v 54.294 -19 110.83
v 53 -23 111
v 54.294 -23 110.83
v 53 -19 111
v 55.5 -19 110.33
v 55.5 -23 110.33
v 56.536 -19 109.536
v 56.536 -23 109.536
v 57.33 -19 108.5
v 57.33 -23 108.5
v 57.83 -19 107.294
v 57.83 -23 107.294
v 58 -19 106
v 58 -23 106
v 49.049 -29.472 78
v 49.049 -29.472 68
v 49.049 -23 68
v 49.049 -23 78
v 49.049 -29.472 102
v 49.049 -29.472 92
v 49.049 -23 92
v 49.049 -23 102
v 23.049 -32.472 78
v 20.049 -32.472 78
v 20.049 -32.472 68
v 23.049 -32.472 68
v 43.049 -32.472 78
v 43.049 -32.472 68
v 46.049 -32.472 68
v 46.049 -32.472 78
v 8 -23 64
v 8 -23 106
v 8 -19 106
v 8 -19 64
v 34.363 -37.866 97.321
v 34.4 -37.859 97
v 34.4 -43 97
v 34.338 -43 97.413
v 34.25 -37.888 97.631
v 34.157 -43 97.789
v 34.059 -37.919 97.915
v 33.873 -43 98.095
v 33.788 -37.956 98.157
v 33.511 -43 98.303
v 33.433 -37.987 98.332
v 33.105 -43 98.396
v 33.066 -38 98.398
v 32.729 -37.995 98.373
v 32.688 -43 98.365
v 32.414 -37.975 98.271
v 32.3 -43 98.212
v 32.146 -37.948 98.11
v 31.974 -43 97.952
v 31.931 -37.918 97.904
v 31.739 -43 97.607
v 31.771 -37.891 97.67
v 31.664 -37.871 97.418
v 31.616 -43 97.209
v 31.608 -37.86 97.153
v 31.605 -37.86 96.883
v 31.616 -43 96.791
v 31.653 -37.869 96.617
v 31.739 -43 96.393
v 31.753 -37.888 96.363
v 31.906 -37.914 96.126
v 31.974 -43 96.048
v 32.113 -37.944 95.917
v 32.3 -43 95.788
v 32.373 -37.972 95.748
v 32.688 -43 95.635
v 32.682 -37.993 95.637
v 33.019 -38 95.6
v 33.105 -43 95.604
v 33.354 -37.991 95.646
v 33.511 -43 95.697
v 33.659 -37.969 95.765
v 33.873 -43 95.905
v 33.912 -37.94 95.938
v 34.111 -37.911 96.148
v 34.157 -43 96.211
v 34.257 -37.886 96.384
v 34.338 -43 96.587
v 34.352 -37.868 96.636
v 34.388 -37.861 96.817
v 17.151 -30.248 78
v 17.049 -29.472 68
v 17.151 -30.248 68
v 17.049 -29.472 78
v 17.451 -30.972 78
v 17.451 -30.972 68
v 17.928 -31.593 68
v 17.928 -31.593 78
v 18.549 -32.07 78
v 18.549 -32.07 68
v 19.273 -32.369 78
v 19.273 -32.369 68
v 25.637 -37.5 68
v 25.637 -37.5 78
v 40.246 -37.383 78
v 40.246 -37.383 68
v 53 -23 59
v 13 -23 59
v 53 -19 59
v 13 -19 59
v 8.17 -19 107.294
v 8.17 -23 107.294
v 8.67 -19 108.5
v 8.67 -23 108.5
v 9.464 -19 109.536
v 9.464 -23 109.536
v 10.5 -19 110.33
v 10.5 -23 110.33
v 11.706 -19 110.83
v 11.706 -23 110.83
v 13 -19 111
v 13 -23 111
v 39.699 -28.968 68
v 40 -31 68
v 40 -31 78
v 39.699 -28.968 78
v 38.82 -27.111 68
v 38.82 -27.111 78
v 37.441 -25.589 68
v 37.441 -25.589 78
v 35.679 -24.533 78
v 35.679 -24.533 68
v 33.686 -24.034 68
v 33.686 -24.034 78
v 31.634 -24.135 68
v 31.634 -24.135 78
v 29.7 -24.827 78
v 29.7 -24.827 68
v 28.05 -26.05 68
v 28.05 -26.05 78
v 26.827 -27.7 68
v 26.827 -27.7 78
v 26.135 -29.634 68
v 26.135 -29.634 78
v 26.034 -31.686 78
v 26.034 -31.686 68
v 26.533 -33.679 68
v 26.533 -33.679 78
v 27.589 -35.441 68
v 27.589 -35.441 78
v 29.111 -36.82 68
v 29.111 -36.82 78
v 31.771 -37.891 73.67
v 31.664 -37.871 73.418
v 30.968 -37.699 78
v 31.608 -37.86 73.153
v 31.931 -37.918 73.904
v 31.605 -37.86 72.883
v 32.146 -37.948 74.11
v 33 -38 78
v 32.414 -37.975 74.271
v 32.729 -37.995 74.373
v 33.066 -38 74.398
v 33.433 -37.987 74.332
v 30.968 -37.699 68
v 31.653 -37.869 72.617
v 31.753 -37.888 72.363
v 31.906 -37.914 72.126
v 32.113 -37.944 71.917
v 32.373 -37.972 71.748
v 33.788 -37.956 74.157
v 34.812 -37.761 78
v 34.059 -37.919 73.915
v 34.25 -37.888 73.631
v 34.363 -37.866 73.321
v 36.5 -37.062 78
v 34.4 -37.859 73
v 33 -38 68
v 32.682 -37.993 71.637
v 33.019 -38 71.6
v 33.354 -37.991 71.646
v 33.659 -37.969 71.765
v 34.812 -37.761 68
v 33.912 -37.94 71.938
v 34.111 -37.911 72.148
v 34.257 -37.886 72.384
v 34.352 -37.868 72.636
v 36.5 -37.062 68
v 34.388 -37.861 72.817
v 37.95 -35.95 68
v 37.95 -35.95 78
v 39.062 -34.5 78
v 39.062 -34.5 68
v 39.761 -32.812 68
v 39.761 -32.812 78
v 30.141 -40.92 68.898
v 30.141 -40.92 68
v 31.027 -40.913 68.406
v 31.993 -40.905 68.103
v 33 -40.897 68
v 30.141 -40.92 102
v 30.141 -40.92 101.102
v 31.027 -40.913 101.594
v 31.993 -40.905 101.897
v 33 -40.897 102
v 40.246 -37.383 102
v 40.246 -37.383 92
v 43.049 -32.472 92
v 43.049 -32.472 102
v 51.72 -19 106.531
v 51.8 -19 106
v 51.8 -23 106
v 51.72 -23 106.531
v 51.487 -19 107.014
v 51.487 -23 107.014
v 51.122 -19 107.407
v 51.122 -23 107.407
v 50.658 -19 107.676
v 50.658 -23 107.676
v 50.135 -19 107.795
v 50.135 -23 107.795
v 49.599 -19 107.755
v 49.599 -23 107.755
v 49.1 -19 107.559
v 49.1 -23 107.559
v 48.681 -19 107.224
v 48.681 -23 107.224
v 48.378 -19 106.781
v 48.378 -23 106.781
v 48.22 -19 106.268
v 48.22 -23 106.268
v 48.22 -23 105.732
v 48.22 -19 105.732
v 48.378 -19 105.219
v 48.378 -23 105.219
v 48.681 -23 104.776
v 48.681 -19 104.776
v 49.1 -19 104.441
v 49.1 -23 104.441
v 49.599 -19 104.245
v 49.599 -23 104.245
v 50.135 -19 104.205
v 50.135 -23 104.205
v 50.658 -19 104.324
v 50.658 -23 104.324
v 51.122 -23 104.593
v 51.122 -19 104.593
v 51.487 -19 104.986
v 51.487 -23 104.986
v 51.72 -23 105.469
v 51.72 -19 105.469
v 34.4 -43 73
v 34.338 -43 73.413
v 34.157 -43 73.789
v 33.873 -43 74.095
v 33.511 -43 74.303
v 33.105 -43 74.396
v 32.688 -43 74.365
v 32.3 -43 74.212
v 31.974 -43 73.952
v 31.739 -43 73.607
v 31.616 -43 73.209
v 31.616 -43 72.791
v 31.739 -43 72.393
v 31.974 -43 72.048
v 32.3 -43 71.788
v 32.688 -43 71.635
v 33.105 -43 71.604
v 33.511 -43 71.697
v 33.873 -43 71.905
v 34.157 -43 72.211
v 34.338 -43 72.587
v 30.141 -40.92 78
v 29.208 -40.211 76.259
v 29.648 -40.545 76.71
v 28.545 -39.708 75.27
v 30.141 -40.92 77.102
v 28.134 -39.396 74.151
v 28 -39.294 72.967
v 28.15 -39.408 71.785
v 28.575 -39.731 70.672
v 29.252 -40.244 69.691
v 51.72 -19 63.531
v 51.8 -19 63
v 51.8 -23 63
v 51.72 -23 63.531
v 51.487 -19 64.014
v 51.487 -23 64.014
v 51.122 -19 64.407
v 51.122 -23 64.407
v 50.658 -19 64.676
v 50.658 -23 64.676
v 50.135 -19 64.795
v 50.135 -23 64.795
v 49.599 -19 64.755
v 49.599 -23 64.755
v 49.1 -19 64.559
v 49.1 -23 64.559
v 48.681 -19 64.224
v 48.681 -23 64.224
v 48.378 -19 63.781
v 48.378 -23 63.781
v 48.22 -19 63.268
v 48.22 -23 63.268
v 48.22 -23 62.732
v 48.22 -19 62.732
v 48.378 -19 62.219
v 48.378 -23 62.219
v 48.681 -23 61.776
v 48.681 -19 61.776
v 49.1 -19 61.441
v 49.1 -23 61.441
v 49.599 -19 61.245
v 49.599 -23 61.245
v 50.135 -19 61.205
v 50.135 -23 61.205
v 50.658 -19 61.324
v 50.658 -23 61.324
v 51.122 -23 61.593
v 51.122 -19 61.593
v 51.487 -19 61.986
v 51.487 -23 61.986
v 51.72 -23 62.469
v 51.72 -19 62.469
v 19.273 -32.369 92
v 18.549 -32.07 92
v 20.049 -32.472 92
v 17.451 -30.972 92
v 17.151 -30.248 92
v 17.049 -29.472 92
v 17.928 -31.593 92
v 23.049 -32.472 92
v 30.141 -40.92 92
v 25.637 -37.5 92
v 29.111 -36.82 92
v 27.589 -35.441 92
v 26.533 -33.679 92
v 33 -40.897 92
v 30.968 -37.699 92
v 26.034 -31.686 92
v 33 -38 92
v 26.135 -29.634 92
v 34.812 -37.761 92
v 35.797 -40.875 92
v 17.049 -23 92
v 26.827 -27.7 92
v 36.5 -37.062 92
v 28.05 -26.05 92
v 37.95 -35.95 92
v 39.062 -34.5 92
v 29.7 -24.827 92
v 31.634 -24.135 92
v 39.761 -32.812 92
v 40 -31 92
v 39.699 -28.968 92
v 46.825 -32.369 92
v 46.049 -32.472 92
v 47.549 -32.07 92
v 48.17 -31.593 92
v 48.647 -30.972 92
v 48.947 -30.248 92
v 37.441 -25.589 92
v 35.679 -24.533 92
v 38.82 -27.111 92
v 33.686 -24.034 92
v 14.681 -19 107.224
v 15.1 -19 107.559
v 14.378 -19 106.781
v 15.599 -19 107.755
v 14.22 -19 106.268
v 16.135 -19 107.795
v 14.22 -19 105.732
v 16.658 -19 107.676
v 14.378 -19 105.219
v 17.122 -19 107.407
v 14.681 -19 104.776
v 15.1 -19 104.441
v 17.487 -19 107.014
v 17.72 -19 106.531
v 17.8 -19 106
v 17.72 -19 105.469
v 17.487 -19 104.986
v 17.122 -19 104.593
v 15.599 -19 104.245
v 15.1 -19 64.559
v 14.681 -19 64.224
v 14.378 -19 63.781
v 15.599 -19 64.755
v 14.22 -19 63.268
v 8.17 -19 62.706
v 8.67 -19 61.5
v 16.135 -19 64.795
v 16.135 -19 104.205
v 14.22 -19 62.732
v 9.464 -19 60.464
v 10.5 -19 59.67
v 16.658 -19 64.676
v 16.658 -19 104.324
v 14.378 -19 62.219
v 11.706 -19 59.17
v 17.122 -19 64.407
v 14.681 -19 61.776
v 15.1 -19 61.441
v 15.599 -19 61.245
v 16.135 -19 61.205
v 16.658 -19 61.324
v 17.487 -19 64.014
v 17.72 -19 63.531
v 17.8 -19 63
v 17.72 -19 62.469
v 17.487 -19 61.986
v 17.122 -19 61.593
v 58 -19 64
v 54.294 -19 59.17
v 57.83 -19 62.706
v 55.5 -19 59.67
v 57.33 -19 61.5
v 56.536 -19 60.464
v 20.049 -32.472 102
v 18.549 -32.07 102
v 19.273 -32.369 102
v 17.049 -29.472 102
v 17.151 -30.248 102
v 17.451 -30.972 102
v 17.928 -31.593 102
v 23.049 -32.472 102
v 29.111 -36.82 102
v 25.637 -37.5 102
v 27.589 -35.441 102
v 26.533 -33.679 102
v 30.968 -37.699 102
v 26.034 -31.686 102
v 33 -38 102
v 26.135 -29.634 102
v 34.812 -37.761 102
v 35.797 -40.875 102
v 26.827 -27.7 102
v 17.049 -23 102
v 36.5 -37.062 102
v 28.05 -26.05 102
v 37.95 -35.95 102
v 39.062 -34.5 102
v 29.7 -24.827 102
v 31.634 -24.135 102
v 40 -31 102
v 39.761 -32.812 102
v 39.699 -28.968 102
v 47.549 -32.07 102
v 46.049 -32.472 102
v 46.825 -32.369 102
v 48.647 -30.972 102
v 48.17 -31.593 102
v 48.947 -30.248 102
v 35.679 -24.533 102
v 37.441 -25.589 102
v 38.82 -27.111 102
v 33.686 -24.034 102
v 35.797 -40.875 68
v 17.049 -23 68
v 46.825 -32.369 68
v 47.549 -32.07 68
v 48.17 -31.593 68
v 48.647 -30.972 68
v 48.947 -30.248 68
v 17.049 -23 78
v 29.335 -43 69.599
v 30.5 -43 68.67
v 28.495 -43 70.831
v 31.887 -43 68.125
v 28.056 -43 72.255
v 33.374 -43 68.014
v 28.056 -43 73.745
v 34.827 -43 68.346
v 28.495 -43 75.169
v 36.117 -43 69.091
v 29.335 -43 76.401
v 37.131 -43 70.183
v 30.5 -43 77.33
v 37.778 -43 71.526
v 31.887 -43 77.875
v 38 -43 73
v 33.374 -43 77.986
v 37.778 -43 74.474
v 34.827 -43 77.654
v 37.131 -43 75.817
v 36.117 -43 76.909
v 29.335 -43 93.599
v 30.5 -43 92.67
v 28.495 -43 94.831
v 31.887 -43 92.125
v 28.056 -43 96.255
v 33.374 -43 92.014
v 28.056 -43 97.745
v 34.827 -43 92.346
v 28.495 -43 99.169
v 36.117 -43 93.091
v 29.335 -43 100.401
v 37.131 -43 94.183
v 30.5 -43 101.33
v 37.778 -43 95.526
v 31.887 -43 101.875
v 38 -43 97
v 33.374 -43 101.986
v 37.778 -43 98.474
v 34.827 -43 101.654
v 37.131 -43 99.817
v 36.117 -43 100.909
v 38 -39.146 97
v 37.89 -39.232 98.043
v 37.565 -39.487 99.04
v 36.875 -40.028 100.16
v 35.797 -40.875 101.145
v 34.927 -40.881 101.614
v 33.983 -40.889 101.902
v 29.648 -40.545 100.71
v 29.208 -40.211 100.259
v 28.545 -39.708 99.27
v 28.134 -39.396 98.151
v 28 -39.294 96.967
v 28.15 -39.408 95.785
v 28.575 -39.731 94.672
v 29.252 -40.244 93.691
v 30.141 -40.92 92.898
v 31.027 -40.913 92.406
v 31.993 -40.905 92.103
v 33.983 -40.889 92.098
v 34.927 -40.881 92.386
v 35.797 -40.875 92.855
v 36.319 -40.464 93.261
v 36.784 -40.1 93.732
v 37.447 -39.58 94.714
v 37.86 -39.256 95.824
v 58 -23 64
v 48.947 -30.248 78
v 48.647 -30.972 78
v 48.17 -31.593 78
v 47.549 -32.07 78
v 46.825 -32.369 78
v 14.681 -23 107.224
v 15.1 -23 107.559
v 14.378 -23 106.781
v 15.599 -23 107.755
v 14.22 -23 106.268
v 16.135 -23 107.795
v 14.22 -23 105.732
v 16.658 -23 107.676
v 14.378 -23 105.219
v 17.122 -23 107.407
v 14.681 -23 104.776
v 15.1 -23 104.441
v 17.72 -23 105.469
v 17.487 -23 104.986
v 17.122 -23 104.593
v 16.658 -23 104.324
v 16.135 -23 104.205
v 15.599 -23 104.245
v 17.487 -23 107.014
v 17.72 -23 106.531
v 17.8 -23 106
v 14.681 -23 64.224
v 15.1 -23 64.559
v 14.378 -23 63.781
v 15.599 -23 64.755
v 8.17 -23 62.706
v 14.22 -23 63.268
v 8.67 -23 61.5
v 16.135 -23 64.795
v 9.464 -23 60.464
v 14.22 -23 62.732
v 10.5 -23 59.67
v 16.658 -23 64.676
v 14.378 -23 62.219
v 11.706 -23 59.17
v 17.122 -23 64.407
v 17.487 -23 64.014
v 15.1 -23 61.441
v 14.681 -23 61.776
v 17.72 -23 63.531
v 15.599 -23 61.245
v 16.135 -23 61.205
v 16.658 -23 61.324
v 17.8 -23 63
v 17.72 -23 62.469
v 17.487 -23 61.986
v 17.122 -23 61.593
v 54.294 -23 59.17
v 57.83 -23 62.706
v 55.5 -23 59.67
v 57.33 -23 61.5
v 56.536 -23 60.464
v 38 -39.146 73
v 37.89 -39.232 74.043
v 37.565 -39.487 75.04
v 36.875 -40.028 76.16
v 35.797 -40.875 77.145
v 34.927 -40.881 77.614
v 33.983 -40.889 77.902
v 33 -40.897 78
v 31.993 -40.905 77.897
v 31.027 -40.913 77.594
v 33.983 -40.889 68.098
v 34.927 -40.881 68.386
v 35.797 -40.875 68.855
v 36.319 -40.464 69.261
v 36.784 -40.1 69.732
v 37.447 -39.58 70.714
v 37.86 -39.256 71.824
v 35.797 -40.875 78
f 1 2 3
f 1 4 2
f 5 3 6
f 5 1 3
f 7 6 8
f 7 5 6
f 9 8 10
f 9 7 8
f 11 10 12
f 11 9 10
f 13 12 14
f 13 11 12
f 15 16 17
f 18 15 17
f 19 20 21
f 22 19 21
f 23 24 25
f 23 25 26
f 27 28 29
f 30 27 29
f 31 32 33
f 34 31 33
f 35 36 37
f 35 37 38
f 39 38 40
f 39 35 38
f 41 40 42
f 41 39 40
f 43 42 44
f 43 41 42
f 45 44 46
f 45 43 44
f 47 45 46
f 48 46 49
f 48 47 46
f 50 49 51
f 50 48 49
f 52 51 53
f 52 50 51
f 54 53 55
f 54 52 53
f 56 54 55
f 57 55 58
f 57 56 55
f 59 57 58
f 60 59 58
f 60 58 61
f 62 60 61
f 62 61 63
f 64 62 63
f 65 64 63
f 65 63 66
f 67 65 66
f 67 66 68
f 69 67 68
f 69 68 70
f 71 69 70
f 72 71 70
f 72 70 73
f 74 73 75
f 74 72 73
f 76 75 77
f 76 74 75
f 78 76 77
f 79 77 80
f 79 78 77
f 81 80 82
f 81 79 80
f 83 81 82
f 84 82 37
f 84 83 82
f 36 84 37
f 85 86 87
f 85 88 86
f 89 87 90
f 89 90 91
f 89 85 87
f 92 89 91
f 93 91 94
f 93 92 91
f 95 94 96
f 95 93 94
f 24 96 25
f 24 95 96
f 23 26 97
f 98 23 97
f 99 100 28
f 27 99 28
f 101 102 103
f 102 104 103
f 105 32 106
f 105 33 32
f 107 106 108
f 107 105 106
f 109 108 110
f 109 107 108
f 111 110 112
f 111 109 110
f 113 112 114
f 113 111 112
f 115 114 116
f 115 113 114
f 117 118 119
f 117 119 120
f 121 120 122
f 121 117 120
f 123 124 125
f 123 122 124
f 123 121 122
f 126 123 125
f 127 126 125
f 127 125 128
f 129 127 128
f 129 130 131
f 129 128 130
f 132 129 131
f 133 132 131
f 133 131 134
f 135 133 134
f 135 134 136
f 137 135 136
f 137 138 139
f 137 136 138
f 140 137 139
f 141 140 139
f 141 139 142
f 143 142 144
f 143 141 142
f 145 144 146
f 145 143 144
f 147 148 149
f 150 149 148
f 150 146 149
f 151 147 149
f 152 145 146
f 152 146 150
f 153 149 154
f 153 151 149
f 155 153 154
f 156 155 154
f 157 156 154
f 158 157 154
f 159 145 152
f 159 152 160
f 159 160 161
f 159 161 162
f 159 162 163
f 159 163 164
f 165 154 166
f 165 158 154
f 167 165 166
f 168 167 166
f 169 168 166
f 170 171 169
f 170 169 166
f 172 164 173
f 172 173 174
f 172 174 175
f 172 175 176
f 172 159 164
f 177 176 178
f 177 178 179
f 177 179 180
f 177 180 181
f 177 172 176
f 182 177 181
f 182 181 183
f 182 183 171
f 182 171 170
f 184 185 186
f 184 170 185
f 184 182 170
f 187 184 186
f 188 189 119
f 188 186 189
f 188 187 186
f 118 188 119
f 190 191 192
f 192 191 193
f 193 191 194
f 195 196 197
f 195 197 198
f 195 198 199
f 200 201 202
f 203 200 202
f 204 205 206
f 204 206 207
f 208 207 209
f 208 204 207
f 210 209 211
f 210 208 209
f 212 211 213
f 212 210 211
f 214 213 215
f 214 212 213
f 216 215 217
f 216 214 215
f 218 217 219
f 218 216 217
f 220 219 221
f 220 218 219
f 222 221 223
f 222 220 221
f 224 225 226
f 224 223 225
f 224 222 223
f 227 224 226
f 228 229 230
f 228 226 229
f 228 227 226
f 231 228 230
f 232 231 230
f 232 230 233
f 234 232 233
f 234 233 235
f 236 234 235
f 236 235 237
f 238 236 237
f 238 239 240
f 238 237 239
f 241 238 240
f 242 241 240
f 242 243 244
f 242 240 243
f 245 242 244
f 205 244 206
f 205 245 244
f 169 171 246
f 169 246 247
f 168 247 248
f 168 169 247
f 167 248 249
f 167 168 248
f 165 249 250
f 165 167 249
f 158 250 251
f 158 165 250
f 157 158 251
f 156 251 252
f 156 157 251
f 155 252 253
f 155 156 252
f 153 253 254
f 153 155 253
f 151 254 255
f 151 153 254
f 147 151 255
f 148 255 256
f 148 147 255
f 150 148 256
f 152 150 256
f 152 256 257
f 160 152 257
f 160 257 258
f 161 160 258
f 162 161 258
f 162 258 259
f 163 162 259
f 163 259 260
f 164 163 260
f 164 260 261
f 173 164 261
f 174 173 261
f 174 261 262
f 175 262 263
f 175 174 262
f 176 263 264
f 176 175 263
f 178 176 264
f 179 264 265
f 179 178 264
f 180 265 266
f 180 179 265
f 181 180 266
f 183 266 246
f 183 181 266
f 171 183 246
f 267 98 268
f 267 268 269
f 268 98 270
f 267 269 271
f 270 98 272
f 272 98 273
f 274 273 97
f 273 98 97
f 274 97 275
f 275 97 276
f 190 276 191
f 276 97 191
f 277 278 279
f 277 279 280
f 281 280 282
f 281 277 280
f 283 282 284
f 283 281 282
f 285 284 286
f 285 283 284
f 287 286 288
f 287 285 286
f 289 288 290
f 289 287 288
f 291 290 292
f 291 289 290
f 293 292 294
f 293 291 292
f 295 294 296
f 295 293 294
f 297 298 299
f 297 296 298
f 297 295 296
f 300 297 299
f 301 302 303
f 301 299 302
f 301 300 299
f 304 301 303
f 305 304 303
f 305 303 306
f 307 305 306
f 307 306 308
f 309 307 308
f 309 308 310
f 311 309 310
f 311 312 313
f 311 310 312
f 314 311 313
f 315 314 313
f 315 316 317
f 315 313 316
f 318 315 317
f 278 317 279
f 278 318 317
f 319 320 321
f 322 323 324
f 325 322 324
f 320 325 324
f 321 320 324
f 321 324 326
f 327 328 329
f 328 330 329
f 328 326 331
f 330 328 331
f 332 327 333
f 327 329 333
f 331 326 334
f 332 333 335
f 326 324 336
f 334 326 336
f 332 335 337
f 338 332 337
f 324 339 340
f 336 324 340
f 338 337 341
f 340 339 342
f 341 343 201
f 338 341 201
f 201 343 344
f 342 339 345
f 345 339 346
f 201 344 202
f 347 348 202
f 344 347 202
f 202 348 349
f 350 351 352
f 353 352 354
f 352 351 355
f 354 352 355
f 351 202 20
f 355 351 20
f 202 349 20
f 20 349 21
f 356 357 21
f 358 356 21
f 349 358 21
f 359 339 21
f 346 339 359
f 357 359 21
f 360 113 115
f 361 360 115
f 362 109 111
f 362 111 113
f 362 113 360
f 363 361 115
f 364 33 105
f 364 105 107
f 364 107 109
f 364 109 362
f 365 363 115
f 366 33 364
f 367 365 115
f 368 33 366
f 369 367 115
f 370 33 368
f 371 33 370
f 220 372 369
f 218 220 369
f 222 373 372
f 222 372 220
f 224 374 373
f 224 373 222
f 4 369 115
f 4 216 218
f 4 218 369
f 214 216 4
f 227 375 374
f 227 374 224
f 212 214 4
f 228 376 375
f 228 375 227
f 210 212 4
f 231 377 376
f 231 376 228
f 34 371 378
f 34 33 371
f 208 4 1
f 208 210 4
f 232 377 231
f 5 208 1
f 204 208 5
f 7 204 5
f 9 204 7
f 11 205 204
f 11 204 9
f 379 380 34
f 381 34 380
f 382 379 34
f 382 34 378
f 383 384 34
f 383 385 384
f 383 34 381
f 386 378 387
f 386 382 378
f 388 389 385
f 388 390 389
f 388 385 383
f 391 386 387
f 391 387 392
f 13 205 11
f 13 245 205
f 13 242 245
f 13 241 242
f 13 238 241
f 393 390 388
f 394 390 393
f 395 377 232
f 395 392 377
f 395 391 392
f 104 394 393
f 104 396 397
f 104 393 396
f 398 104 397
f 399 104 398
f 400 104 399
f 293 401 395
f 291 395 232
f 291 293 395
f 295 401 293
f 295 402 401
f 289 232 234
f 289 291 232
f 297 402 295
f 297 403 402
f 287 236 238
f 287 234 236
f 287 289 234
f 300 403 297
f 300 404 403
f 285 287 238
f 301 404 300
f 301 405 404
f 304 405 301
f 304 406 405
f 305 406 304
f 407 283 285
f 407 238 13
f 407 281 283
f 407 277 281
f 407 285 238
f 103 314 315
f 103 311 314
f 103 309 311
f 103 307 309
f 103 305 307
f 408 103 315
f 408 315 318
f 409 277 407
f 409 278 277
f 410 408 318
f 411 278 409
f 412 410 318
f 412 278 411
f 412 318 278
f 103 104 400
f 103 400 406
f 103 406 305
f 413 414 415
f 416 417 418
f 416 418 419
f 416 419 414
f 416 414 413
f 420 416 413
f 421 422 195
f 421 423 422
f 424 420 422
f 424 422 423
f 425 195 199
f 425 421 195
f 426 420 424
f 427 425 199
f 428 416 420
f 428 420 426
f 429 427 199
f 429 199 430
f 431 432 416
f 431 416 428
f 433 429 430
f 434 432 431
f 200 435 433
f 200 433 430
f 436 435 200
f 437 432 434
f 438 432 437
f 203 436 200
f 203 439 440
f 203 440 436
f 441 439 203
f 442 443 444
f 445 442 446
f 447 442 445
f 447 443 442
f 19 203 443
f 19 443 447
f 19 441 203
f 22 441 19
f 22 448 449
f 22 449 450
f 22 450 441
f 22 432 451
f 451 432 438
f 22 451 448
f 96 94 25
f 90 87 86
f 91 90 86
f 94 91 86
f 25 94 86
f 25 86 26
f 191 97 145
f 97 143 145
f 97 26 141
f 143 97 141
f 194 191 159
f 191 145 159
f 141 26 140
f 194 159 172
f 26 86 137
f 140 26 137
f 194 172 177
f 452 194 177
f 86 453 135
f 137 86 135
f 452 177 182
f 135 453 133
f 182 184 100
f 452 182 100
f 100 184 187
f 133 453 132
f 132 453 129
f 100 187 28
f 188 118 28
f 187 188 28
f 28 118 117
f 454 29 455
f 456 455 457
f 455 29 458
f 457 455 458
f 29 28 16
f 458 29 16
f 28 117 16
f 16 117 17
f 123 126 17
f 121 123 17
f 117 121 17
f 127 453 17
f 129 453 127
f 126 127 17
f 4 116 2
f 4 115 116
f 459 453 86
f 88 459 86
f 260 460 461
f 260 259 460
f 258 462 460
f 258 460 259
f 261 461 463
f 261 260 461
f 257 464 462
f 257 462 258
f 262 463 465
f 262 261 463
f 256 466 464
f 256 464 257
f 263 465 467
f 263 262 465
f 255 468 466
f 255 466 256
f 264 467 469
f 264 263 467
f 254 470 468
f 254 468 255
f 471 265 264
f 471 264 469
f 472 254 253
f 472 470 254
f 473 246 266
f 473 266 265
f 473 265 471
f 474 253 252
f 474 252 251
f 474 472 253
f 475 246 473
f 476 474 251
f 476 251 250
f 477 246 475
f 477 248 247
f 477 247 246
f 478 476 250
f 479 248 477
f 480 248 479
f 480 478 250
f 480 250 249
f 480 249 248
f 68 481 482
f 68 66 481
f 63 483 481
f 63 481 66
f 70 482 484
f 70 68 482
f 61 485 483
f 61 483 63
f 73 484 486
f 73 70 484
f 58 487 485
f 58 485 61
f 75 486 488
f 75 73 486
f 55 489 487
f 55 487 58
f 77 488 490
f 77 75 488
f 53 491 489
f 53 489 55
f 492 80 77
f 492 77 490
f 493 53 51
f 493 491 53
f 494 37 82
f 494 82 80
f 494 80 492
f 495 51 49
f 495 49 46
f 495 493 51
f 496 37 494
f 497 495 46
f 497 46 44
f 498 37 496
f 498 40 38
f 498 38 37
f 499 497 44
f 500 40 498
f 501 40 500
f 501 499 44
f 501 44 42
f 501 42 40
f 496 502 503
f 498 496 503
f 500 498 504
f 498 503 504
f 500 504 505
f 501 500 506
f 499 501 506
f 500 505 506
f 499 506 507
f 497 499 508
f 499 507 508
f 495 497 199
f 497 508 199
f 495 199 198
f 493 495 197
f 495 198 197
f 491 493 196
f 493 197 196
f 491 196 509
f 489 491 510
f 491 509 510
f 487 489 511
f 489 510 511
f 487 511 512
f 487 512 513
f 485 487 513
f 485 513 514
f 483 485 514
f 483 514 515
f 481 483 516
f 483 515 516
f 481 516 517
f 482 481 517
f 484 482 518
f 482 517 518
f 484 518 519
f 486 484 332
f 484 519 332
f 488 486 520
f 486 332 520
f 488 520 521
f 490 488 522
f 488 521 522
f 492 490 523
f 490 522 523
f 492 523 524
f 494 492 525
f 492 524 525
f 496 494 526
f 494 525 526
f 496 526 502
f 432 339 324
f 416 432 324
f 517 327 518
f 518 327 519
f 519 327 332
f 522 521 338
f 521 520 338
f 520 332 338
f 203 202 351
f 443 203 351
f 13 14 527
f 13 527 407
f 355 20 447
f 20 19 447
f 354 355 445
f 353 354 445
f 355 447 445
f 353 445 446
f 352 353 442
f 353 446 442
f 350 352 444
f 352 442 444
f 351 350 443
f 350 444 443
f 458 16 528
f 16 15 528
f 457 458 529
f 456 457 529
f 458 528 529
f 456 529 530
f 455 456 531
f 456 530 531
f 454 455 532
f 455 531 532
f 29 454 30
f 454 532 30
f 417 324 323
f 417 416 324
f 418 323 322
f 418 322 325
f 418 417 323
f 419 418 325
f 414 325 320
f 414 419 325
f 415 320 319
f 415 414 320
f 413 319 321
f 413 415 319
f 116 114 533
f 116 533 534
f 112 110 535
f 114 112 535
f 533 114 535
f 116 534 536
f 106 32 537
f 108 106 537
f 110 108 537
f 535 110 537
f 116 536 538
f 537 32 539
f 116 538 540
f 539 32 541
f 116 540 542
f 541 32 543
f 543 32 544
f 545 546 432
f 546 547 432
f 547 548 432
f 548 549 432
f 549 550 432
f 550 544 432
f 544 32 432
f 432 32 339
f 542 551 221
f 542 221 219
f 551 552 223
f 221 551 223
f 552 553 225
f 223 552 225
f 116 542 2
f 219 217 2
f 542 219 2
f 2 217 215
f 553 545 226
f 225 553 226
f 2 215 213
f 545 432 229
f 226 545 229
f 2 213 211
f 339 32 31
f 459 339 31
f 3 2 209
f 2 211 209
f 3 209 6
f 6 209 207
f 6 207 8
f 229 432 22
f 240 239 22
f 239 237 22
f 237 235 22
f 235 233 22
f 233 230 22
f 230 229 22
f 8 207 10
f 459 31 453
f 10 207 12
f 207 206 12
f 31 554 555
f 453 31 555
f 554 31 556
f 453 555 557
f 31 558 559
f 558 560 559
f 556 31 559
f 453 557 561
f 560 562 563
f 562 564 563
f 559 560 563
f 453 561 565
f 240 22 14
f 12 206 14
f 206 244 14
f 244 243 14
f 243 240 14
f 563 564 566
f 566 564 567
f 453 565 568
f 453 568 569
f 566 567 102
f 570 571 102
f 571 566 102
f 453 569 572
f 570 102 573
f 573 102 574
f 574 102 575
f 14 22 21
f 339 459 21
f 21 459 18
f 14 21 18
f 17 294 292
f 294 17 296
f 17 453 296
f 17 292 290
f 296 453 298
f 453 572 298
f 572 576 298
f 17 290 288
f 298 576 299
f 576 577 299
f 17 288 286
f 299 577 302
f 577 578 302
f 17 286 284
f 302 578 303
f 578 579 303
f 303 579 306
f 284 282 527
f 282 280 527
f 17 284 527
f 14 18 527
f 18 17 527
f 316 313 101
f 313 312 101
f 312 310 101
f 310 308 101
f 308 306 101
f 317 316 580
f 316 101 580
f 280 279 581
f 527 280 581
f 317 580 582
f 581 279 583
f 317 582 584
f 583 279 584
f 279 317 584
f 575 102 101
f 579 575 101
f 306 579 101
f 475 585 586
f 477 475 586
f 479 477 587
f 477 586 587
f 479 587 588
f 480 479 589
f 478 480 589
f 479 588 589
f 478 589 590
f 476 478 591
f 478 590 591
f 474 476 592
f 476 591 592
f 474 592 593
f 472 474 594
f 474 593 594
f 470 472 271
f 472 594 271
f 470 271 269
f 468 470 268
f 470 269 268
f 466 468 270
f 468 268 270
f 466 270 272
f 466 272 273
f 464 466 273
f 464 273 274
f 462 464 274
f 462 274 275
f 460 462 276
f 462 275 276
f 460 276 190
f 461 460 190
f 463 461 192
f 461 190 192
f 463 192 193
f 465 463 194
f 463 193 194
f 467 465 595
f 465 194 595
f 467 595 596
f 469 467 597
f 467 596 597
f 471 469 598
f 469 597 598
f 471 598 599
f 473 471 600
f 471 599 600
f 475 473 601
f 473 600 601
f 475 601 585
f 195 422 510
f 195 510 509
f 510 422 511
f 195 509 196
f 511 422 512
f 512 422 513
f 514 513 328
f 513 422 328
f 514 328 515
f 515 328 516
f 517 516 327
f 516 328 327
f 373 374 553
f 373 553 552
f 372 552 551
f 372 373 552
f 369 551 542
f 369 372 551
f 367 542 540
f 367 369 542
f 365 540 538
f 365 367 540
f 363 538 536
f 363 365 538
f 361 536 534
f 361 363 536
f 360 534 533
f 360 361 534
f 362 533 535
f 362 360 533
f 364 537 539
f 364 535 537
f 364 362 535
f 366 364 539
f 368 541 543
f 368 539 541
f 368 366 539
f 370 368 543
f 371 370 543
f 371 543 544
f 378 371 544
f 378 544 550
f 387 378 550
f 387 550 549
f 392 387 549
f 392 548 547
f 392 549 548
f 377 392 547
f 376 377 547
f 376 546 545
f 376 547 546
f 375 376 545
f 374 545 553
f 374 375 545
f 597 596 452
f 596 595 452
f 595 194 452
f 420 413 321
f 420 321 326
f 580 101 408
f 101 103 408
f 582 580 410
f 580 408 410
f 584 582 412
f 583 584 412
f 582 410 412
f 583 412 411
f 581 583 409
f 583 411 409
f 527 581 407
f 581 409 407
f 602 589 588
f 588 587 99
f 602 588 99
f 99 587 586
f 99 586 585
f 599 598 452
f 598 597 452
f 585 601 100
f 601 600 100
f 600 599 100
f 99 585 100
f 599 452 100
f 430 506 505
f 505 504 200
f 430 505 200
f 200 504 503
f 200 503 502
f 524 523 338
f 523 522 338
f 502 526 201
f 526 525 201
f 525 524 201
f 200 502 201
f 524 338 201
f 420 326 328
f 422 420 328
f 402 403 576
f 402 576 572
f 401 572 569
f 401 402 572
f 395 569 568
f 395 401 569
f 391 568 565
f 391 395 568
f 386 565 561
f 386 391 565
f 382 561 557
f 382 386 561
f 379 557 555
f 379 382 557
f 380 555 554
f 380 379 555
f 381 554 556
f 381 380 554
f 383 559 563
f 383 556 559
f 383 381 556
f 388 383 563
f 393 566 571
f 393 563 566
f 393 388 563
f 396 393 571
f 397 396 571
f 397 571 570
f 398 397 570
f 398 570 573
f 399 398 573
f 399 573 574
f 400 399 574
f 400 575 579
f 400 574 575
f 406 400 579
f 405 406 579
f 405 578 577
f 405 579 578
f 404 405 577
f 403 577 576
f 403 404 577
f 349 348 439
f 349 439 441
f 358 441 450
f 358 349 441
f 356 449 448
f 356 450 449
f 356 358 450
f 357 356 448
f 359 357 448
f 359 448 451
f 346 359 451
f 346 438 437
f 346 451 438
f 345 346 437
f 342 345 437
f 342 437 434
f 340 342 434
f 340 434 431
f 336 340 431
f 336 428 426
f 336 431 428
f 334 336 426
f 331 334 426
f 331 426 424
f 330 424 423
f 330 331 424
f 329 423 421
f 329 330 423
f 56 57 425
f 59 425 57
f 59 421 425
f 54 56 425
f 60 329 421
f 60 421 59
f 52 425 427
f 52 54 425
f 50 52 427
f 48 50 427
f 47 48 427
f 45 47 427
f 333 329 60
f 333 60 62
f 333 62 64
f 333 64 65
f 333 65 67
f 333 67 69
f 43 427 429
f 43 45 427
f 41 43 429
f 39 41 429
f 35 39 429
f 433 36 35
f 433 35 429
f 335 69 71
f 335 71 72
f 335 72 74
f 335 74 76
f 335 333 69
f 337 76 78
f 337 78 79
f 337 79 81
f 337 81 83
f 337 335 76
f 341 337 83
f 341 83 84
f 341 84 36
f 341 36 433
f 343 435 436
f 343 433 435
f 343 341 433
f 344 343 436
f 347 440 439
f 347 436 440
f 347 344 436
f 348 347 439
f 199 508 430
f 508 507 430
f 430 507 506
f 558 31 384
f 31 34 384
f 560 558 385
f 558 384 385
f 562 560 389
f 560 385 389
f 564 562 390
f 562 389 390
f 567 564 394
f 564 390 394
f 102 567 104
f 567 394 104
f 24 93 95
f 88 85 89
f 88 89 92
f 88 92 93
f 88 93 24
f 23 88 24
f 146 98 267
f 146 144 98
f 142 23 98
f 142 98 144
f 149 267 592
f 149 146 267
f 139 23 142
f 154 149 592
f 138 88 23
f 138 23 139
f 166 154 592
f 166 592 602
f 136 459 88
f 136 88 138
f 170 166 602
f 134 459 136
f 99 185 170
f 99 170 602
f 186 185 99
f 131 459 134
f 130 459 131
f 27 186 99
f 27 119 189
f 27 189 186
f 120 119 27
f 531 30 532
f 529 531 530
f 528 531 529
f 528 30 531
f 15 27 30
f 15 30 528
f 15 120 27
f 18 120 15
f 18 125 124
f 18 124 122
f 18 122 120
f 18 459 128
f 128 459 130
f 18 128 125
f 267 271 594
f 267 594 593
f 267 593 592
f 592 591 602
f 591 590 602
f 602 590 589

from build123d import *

# Parameters (mm, degrees)
BOX058_W                = 50
BOX058_H                = 37
BOX058_DEPTH            = 48
BOX057_W                = 59
BOX057_H                = 68
BOX057_DEPTH            = 48
BOX056_W                = 3
BOX056_H                = 6
BOX056_DEPTH            = 23
CYLINDER114_R           = 1.4
CYLINDER114_DEPTH       = 10
CYLINDER114_ROLL_ANGLE  = 90
CYLINDER116_R           = 1.4
CYLINDER116_DEPTH       = 10
CYLINDER116_ROLL_ANGLE  = 90
CYLINDER113_R           = 5
CYLINDER113_DEPTH       = 5
CYLINDER113_ROLL_ANGLE  = 90
CYLINDER112_R           = 3
CYLINDER112_DEPTH       = 180
CYLINDER112_PITCH_ANGLE = 90
PAD056_DEPTH            = 10
PAD055_DEPTH            = 10
CYLINDER110_R           = 7.5
CYLINDER110_DEPTH       = 180
CYLINDER110_PITCH_ANGLE = 90
CYLINDER111_R           = 7
CYLINDER111_DEPTH       = 120
PAD054_DEPTH            = 10
PAD053_DEPTH            = 10
BOX055_W                = 32
BOX055_H                = 23
BOX055_DEPTH            = 22
FILLET045_R             = 5
FILLET046_R             = 8
FILLET047_R             = 8
FILLET048_R             = 3
FILLET049_R             = 1
FILLET050_R             = 1
FILLET051_R             = 1
FILLET052_R             = 1
CYLINDER115_R           = 5
CYLINDER115_DEPTH       = 5
CYLINDER115_ROLL_ANGLE  = 90
BOX048_W                = 50
BOX048_H                = 37
BOX048_DEPTH            = 48
BOX046_W                = 59
BOX046_H                = 68
BOX046_DEPTH            = 48
BOX040_W                = 3
BOX040_H                = 6
BOX040_DEPTH            = 23
CYLINDER082_R           = 1.4
CYLINDER082_DEPTH       = 10
CYLINDER082_ROLL_ANGLE  = 90
CYLINDER084_R           = 1.4
CYLINDER084_DEPTH       = 10
CYLINDER084_ROLL_ANGLE  = 90
CYLINDER081_R           = 5
CYLINDER081_DEPTH       = 5
CYLINDER081_ROLL_ANGLE  = 90
CYLINDER080_R           = 3
CYLINDER080_DEPTH       = 180
CYLINDER080_PITCH_ANGLE = 90
PAD044_DEPTH            = 10
PAD043_DEPTH            = 10
CYLINDER075_R           = 7.5
CYLINDER075_DEPTH       = 180
CYLINDER075_PITCH_ANGLE = 90
CYLINDER077_R           = 7
CYLINDER077_DEPTH       = 120
PAD042_DEPTH            = 10
PAD_DEPTH               = 10
BOX039_W                = 32
BOX039_H                = 23
BOX039_DEPTH            = 22
FILLET021_R             = 5
FILLET022_R             = 8
FILLET023_R             = 8
FILLET024_R             = 3
FILLET025_R             = 1
FILLET026_R             = 1
FILLET027_R             = 1
FILLET028_R             = 1
CYLINDER083_R           = 5
CYLINDER083_DEPTH       = 5
CYLINDER083_ROLL_ANGLE  = 90
CYLINDER103_R           = 1.8
CYLINDER103_DEPTH       = 34
CYLINDER103_ROLL_ANGLE  = 90
CYLINDER102_R           = 1.8
CYLINDER102_DEPTH       = 34
CYLINDER102_ROLL_ANGLE  = 90
CYLINDER105_R           = 1.8
CYLINDER105_DEPTH       = 34
CYLINDER105_ROLL_ANGLE  = 90
CYLINDER104_R           = 1.8
CYLINDER104_DEPTH       = 34
CYLINDER104_ROLL_ANGLE  = 90
BOX053_W                = 50
BOX053_H                = 4
BOX053_DEPTH            = 52
FILLET053_R             = 5


with BuildPart() as cubo053:
    # Box058 → Box058 (new body)
    with BuildSketch(Plane(origin=(8, -47, 80), x_dir=(1, 0, 0), z_dir=(0, 0, 1))):
        with Locations((25, 18.5)):
            Rectangle(BOX058_W, BOX058_H)
    extrude(amount=BOX058_DEPTH)


with BuildPart() as cubo052:
    # Box057 → Box057 (new body)
    with BuildSketch(Plane(origin=(0, -19, 64), x_dir=(1, 0, 0), z_dir=(0, 0, 1))):
        with Locations((29.5, 34)):
            Rectangle(BOX057_W, BOX057_H)
    extrude(amount=BOX057_DEPTH)


with BuildPart() as cubo051:
    # Box056 → Box056 (new body)
    with BuildSketch(Plane(origin=(17, -11, 79), x_dir=(1, 0, 0), z_dir=(0, 0, 1))):
        with Locations((1.5, 3)):
            Rectangle(BOX056_W, BOX056_H)
    extrude(amount=BOX056_DEPTH)


with BuildPart() as cilindro068:
    # Cylinder114 → Cylinder114 (new body)
    with BuildSketch(Plane.XY):
        Circle(CYLINDER114_R)
    extrude(amount=CYLINDER114_DEPTH)


with BuildPart() as cilindro068_1:
    # Cylinder114 roll: moved
    add(cilindro068.part.rotate(Axis((0, 0, 0), (1, 0, 0)), CYLINDER114_ROLL_ANGLE))


with BuildPart() as cilindro068_2:
    # Cylinder114 placement: moved
    add(cilindro068_1.part.moved(Location((33, -27, 105))))


with BuildPart() as cilindro070:
    # Cylinder116 → Cylinder116 (new body)
    with BuildSketch(Plane.XY):
        Circle(CYLINDER116_R)
    extrude(amount=CYLINDER116_DEPTH)


with BuildPart() as cilindro070_1:
    # Cylinder116 roll: moved
    add(cilindro070.part.rotate(Axis((0, 0, 0), (1, 0, 0)), CYLINDER116_ROLL_ANGLE))


with BuildPart() as cilindro070_2:
    # Cylinder116 placement: moved
    add(cilindro070_1.part.moved(Location((33, -27, 75))))


with BuildPart() as cilindro067:
    # Cylinder113 → Cylinder113 (new body)
    with BuildSketch(Plane.XY):
        Circle(CYLINDER113_R)
    extrude(amount=CYLINDER113_DEPTH)


with BuildPart() as cilindro067_1:
    # Cylinder113 roll: moved
    add(cilindro067.part.rotate(Axis((0, 0, 0), (1, 0, 0)), CYLINDER113_ROLL_ANGLE))


with BuildPart() as cilindro067_2:
    # Cylinder113 placement: moved
    add(cilindro067_1.part.moved(Location((33, -31, 105))))


with BuildPart() as m033:
    # Cylinder112 → Cylinder112 (new body)
    with BuildSketch(Plane.XY):
        Circle(CYLINDER112_R)
    extrude(amount=CYLINDER112_DEPTH)


with BuildPart() as m033_1:
    # Cylinder112 pitch: moved
    add(m033.part.rotate(Axis((0, 0, 0), (0, 1, 0)), CYLINDER112_PITCH_ANGLE))


with BuildPart() as m033_2:
    # Cylinder112 placement: moved
    add(m033_1.part.moved(Location((-12, 9, 100))))


with BuildPart() as pad056:
    # Sketch063 → Pad056 (new body)
    with BuildSketch(Plane(origin=(43, 9, 0), x_dir=(0, 1, 0), z_dir=(1, 0, 0))):
        Polygon((-4.713422, 99.981385), (-2.357765, 95.901267), (2.35355, 95.901267), (4.709208, 99.981385), (2.35355, 104.061504), (-2.357765, 104.061504), align=None)
    extrude(amount=PAD056_DEPTH)


with BuildPart() as pad055:
    # Sketch062 → Pad055 (new body)
    with BuildSketch(Plane(origin=(13, 9, 0), x_dir=(0, 1, 0), z_dir=(1, 0, 0))):
        Polygon((-4.713422, 99.981385), (-2.357765, 95.901267), (2.35355, 95.901267), (4.709208, 99.981385), (2.35355, 104.061504), (-2.357765, 104.061504), align=None)
    extrude(amount=PAD055_DEPTH)


with BuildPart() as m032:
    # Cylinder110 → Cylinder110 (new body)
    with BuildSketch(Plane.XY):
        Circle(CYLINDER110_R)
    extrude(amount=CYLINDER110_DEPTH)


with BuildPart() as m032_1:
    # Cylinder110 pitch: moved
    add(m032.part.rotate(Axis((0, 0, 0), (0, 1, 0)), CYLINDER110_PITCH_ANGLE))


with BuildPart() as m032_2:
    # Cylinder110 placement: moved
    add(m032_1.part.moved(Location((-12, 12, 80))))


with BuildPart() as cilindro066:
    # Cylinder111 → Cylinder111 (new body)
    with BuildSketch(Plane(origin=(33, -24, 41), x_dir=(1, 0, 0), z_dir=(0, 0, 1))):
        Circle(CYLINDER111_R)
    extrude(amount=CYLINDER111_DEPTH)


with BuildPart() as pad054:
    # Sketch061 → Pad054 (new body)
    with BuildSketch(Plane.XY.offset(100)):
        Polygon((23.049006, -25.471541), (25.637042, -30.500033), (30.141413, -33.919727), (35.796642, -33.874552), (40.245807, -30.383337), (43.049006, -25.471541), (49.049006, -25.471541), (49.049006, 22.988138), (17.049006, 22.988138), (17.049006, -25.471541), align=None)
        with BuildLine():
            ThreePointArc((26.014116, -2.124694), (20.116872, -8.021937), (26.014116, -13.919181))
            Line((26.014116, -13.919181), (40.6833, -13.919181))
            ThreePointArc((40.6833, -13.919181), (46.580544, -8.021937), (40.6833, -2.124694))
            Line((26.014116, -2.124694), (40.6833, -2.124694))
        make_face(mode=Mode.SUBTRACT)
    extrude(amount=PAD054_DEPTH)


with BuildPart() as pad053:
    # Sketch060 → Pad053 (new body)
    with BuildSketch(Plane.XY.offset(70)):
        Polygon((23.049006, -25.471541), (25.637042, -30.500033), (30.141413, -33.919727), (35.796642, -33.874552), (40.245807, -30.383337), (43.049006, -25.471541), (49.049006, -25.471541), (49.049006, 22.988138), (17.049006, 22.988138), (17.049006, -25.471541), align=None)
        with BuildLine():
            ThreePointArc((26.014116, -2.124694), (20.116872, -8.021937), (26.014116, -13.919181))
            Line((26.014116, -13.919181), (40.6833, -13.919181))
            ThreePointArc((40.6833, -13.919181), (46.580544, -8.021937), (40.6833, -2.124694))
            Line((26.014116, -2.124694), (40.6833, -2.124694))
        make_face(mode=Mode.SUBTRACT)
    extrude(amount=PAD053_DEPTH)


with BuildPart() as fillet052:
    # Box055 → Box055 (new body)
    with BuildSketch(Plane(origin=(17, 0, 79), x_dir=(1, 0, 0), z_dir=(0, 0, 1))):
        with Locations((16, 11.5)):
            Rectangle(BOX055_W, BOX055_H)
    extrude(amount=BOX055_DEPTH)

    # Fusion062: union Pad054, Pad053
    add(pad054.part)
    add(pad053.part)

    # Cut127: cut Cilindro066
    add(cilindro066.part, mode=Mode.SUBTRACT)

    # Cut128: cut M032
    add(m032_2.part, mode=Mode.SUBTRACT)

    # Fillet045
    fillet045_edges = [fillet052.edges().sort_by_distance(p)[0] for p in [
        (33.348708, -2.124694, 100),
    ]]
    fillet(fillet045_edges, radius=FILLET045_R)

    # Fillet046
    fillet046_edges = [fillet052.edges().sort_by_distance(p)[0] for p in [
        (33.049006, 22.988138, 110),
    ]]
    fillet(fillet046_edges, radius=FILLET046_R)

    # Fillet047
    fillet047_edges = [fillet052.edges().sort_by_distance(p)[0] for p in [
        (33.049006, 22.988138, 70),
    ]]
    fillet(fillet047_edges, radius=FILLET047_R)

    # Fillet048
    fillet048_edges = [fillet052.edges().sort_by_distance(p)[0] for p in [
        (17.049006, -25.471541, 75),
        (49.049006, -25.471541, 75),
        (17.049006, -25.471541, 105),
        (49.049006, -25.471541, 105),
    ]]
    fillet(fillet048_edges, radius=FILLET048_R)

    # Fillet049
    fillet049_edges = [fillet052.edges().sort_by_distance(p)[0] for p in [
        (20.116872, -8.021937, 110),
    ]]
    fillet(fillet049_edges, radius=FILLET049_R)

    # Fillet050
    fillet050_edges = [fillet052.edges().sort_by_distance(p)[0] for p in [
        (46.580544, -8.021937, 80),
    ]]
    fillet(fillet050_edges, radius=FILLET050_R)

    # Fillet051
    fillet051_edges = [fillet052.edges().sort_by_distance(p)[0] for p in [
        (46.580544, -8.021937, 70),
    ]]
    fillet(fillet051_edges, radius=FILLET051_R)

    # Cut129: cut Pad055
    add(pad055.part, mode=Mode.SUBTRACT)

    # Cut130: cut Pad056
    add(pad056.part, mode=Mode.SUBTRACT)

    # Cut131: cut M033
    add(m033_2.part, mode=Mode.SUBTRACT)

    # Fillet052
    fillet052_edges = [fillet052.edges().sort_by_distance(p)[0] for p in [
        (33.024503, 0, 80),
    ]]
    fillet(fillet052_edges, radius=FILLET052_R)


with BuildPart() as cut135:
    # Cylinder115 → Cylinder115 (new body)
    with BuildSketch(Plane.XY):
        Circle(CYLINDER115_R)
    extrude(amount=CYLINDER115_DEPTH)


with BuildPart() as cut135_1:
    # Cylinder115 roll: moved
    add(cut135.part.rotate(Axis((0, 0, 0), (1, 0, 0)), CYLINDER115_ROLL_ANGLE))


with BuildPart() as cut135_2:
    # Cylinder115 placement: moved
    add(cut135_1.part.moved(Location((33, -31, 75))))

    # Fusion063: union Cilindro067, Fillet052
    add(cilindro067_2.part)
    add(fillet052.part)

    # Cut132: cut Cilindro070
    add(cilindro070_2.part, mode=Mode.SUBTRACT)

    # Cut133: cut Cilindro068
    add(cilindro068_2.part, mode=Mode.SUBTRACT)

    # Fusion064: union Cubo051
    add(cubo051.part)


with BuildPart() as cut135_3:
    # Fusion064 placement: moved
    add(cut135_2.part.moved(Location((0, -4, -2))))

    # Cut134: cut Cubo052
    add(cubo052.part, mode=Mode.SUBTRACT)


with BuildPart() as cut135_4:
    # Cut134 placement: moved
    add(cut135_3.part.moved(Location((0, -3, 0))))

    # Cut135: cut Cubo053
    add(cubo053.part, mode=Mode.SUBTRACT)


with BuildPart() as cut135_5:
    # Cut135 placement: moved
    add(cut135_4.part.moved(Location((0, 0, 24))))


with BuildPart() as cubo043:
    # Box048 → Box048 (new body)
    with BuildSketch(Plane(origin=(8, -47, 80), x_dir=(1, 0, 0), z_dir=(0, 0, 1))):
        with Locations((25, 18.5)):
            Rectangle(BOX048_W, BOX048_H)
    extrude(amount=BOX048_DEPTH)


with BuildPart() as cubo041:
    # Box046 → Box046 (new body)
    with BuildSketch(Plane(origin=(0, -19, 64), x_dir=(1, 0, 0), z_dir=(0, 0, 1))):
        with Locations((29.5, 34)):
            Rectangle(BOX046_W, BOX046_H)
    extrude(amount=BOX046_DEPTH)


with BuildPart() as cubo035:
    # Box040 → Box040 (new body)
    with BuildSketch(Plane(origin=(17, -11, 79), x_dir=(1, 0, 0), z_dir=(0, 0, 1))):
        with Locations((1.5, 3)):
            Rectangle(BOX040_W, BOX040_H)
    extrude(amount=BOX040_DEPTH)


with BuildPart() as cilindro044:
    # Cylinder082 → Cylinder082 (new body)
    with BuildSketch(Plane.XY):
        Circle(CYLINDER082_R)
    extrude(amount=CYLINDER082_DEPTH)


with BuildPart() as cilindro044_1:
    # Cylinder082 roll: moved
    add(cilindro044.part.rotate(Axis((0, 0, 0), (1, 0, 0)), CYLINDER082_ROLL_ANGLE))


with BuildPart() as cilindro044_2:
    # Cylinder082 placement: moved
    add(cilindro044_1.part.moved(Location((33, -27, 105))))


with BuildPart() as cilindro046:
    # Cylinder084 → Cylinder084 (new body)
    with BuildSketch(Plane.XY):
        Circle(CYLINDER084_R)
    extrude(amount=CYLINDER084_DEPTH)


with BuildPart() as cilindro046_1:
    # Cylinder084 roll: moved
    add(cilindro046.part.rotate(Axis((0, 0, 0), (1, 0, 0)), CYLINDER084_ROLL_ANGLE))


with BuildPart() as cilindro046_2:
    # Cylinder084 placement: moved
    add(cilindro046_1.part.moved(Location((33, -27, 75))))


with BuildPart() as cilindro043:
    # Cylinder081 → Cylinder081 (new body)
    with BuildSketch(Plane.XY):
        Circle(CYLINDER081_R)
    extrude(amount=CYLINDER081_DEPTH)


with BuildPart() as cilindro043_1:
    # Cylinder081 roll: moved
    add(cilindro043.part.rotate(Axis((0, 0, 0), (1, 0, 0)), CYLINDER081_ROLL_ANGLE))


with BuildPart() as cilindro043_2:
    # Cylinder081 placement: moved
    add(cilindro043_1.part.moved(Location((33, -31, 105))))


with BuildPart() as m028:
    # Cylinder080 → Cylinder080 (new body)
    with BuildSketch(Plane.XY):
        Circle(CYLINDER080_R)
    extrude(amount=CYLINDER080_DEPTH)


with BuildPart() as m028_1:
    # Cylinder080 pitch: moved
    add(m028.part.rotate(Axis((0, 0, 0), (0, 1, 0)), CYLINDER080_PITCH_ANGLE))


with BuildPart() as m028_2:
    # Cylinder080 placement: moved
    add(m028_1.part.moved(Location((-12, 9, 100))))


with BuildPart() as pad044:
    # Sketch051 → Pad044 (new body)
    with BuildSketch(Plane(origin=(43, 9, 0), x_dir=(0, 1, 0), z_dir=(1, 0, 0))):
        Polygon((-4.713422, 99.981385), (-2.357765, 95.901267), (2.35355, 95.901267), (4.709208, 99.981385), (2.35355, 104.061504), (-2.357765, 104.061504), align=None)
    extrude(amount=PAD044_DEPTH)


with BuildPart() as pad043:
    # Sketch050 → Pad043 (new body)
    with BuildSketch(Plane(origin=(13, 9, 0), x_dir=(0, 1, 0), z_dir=(1, 0, 0))):
        Polygon((-4.713422, 99.981385), (-2.357765, 95.901267), (2.35355, 95.901267), (4.709208, 99.981385), (2.35355, 104.061504), (-2.357765, 104.061504), align=None)
    extrude(amount=PAD043_DEPTH)


with BuildPart() as m025:
    # Cylinder075 → Cylinder075 (new body)
    with BuildSketch(Plane.XY):
        Circle(CYLINDER075_R)
    extrude(amount=CYLINDER075_DEPTH)


with BuildPart() as m025_1:
    # Cylinder075 pitch: moved
    add(m025.part.rotate(Axis((0, 0, 0), (0, 1, 0)), CYLINDER075_PITCH_ANGLE))


with BuildPart() as m025_2:
    # Cylinder075 placement: moved
    add(m025_1.part.moved(Location((-12, 12, 80))))


with BuildPart() as cilindro042:
    # Cylinder077 → Cylinder077 (new body)
    with BuildSketch(Plane(origin=(33, -24, 41), x_dir=(1, 0, 0), z_dir=(0, 0, 1))):
        Circle(CYLINDER077_R)
    extrude(amount=CYLINDER077_DEPTH)


with BuildPart() as pad042:
    # Sketch048 → Pad042 (new body)
    with BuildSketch(Plane.XY.offset(100)):
        Polygon((23.049006, -25.471541), (25.637042, -30.500033), (30.141413, -33.919727), (35.796642, -33.874552), (40.245807, -30.383337), (43.049006, -25.471541), (49.049006, -25.471541), (49.049006, 22.988138), (17.049006, 22.988138), (17.049006, -25.471541), align=None)
        with BuildLine():
            ThreePointArc((26.014116, -2.124694), (20.116872, -8.021937), (26.014116, -13.919181))
            Line((26.014116, -13.919181), (40.6833, -13.919181))
            ThreePointArc((40.6833, -13.919181), (46.580544, -8.021937), (40.6833, -2.124694))
            Line((26.014116, -2.124694), (40.6833, -2.124694))
        make_face(mode=Mode.SUBTRACT)
    extrude(amount=PAD042_DEPTH)


with BuildPart() as pad:
    # Sketch → Pad (new body)
    with BuildSketch(Plane.XY.offset(70)):
        Polygon((23.049006, -25.471541), (25.637042, -30.500033), (30.141413, -33.919727), (35.796642, -33.874552), (40.245807, -30.383337), (43.049006, -25.471541), (49.049006, -25.471541), (49.049006, 22.988138), (17.049006, 22.988138), (17.049006, -25.471541), align=None)
        with BuildLine():
            ThreePointArc((26.014116, -2.124694), (20.116872, -8.021937), (26.014116, -13.919181))
            Line((26.014116, -13.919181), (40.6833, -13.919181))
            ThreePointArc((40.6833, -13.919181), (46.580544, -8.021937), (40.6833, -2.124694))
            Line((26.014116, -2.124694), (40.6833, -2.124694))
        make_face(mode=Mode.SUBTRACT)
    extrude(amount=PAD_DEPTH)


with BuildPart() as fillet028:
    # Box039 → Box039 (new body)
    with BuildSketch(Plane(origin=(17, 0, 79), x_dir=(1, 0, 0), z_dir=(0, 0, 1))):
        with Locations((16, 11.5)):
            Rectangle(BOX039_W, BOX039_H)
    extrude(amount=BOX039_DEPTH)

    # Fusion041: union Pad042, Pad
    add(pad042.part)
    add(pad.part)

    # Cut100: cut Cilindro042
    add(cilindro042.part, mode=Mode.SUBTRACT)

    # Cut101: cut M025
    add(m025_2.part, mode=Mode.SUBTRACT)

    # Fillet021
    fillet021_edges = [fillet028.edges().sort_by_distance(p)[0] for p in [
        (33.348708, -2.124694, 100),
    ]]
    fillet(fillet021_edges, radius=FILLET021_R)

    # Fillet022
    fillet022_edges = [fillet028.edges().sort_by_distance(p)[0] for p in [
        (33.049006, 22.988138, 110),
    ]]
    fillet(fillet022_edges, radius=FILLET022_R)

    # Fillet023
    fillet023_edges = [fillet028.edges().sort_by_distance(p)[0] for p in [
        (33.049006, 22.988138, 70),
    ]]
    fillet(fillet023_edges, radius=FILLET023_R)

    # Fillet024
    fillet024_edges = [fillet028.edges().sort_by_distance(p)[0] for p in [
        (17.049006, -25.471541, 75),
        (49.049006, -25.471541, 75),
        (17.049006, -25.471541, 105),
        (49.049006, -25.471541, 105),
    ]]
    fillet(fillet024_edges, radius=FILLET024_R)

    # Fillet025
    fillet025_edges = [fillet028.edges().sort_by_distance(p)[0] for p in [
        (20.116872, -8.021937, 110),
    ]]
    fillet(fillet025_edges, radius=FILLET025_R)

    # Fillet026
    fillet026_edges = [fillet028.edges().sort_by_distance(p)[0] for p in [
        (46.580544, -8.021937, 80),
    ]]
    fillet(fillet026_edges, radius=FILLET026_R)

    # Fillet027
    fillet027_edges = [fillet028.edges().sort_by_distance(p)[0] for p in [
        (46.580544, -8.021937, 70),
    ]]
    fillet(fillet027_edges, radius=FILLET027_R)

    # Cut102: cut Pad043
    add(pad043.part, mode=Mode.SUBTRACT)

    # Cut103: cut Pad044
    add(pad044.part, mode=Mode.SUBTRACT)

    # Cut104: cut M028
    add(m028_2.part, mode=Mode.SUBTRACT)

    # Fillet028
    fillet028_edges = [fillet028.edges().sort_by_distance(p)[0] for p in [
        (33.024503, 0, 80),
    ]]
    fillet(fillet028_edges, radius=FILLET028_R)


with BuildPart() as cut122:
    # Cylinder083 → Cylinder083 (new body)
    with BuildSketch(Plane.XY):
        Circle(CYLINDER083_R)
    extrude(amount=CYLINDER083_DEPTH)


with BuildPart() as cut122_1:
    # Cylinder083 roll: moved
    add(cut122.part.rotate(Axis((0, 0, 0), (1, 0, 0)), CYLINDER083_ROLL_ANGLE))


with BuildPart() as cut122_2:
    # Cylinder083 placement: moved
    add(cut122_1.part.moved(Location((33, -31, 75))))

    # Fusion042: union Cilindro043, Fillet028
    add(cilindro043_2.part)
    add(fillet028.part)

    # Cut105: cut Cilindro046
    add(cilindro046_2.part, mode=Mode.SUBTRACT)

    # Cut106: cut Cilindro044
    add(cilindro044_2.part, mode=Mode.SUBTRACT)

    # Fusion043: union Cubo035
    add(cubo035.part)


with BuildPart() as cut122_3:
    # Fusion043 placement: moved
    add(cut122_2.part.moved(Location((0, -4, -2))))

    # Cut121: cut Cubo041
    add(cubo041.part, mode=Mode.SUBTRACT)


with BuildPart() as cut122_4:
    # Cut121 placement: moved
    add(cut122_3.part.moved(Location((0, -3, 0))))

    # Cut122: cut Cubo043
    add(cubo043.part, mode=Mode.SUBTRACT)


with BuildPart() as cilindro059:
    # Cylinder103 → Cylinder103 (new body)
    with BuildSketch(Plane.XY):
        Circle(CYLINDER103_R)
    extrude(amount=CYLINDER103_DEPTH)


with BuildPart() as cilindro059_1:
    # Cylinder103 roll: moved
    add(cilindro059.part.rotate(Axis((0, 0, 0), (1, 0, 0)), CYLINDER103_ROLL_ANGLE))


with BuildPart() as cilindro059_2:
    # Cylinder103 placement: moved
    add(cilindro059_1.part.moved(Location((16, -10, 63))))


with BuildPart() as fusion056:
    # Cylinder102 → Cylinder102 (new body)
    with BuildSketch(Plane.XY):
        Circle(CYLINDER102_R)
    extrude(amount=CYLINDER102_DEPTH)


with BuildPart() as fusion056_1:
    # Cylinder102 roll: moved
    add(fusion056.part.rotate(Axis((0, 0, 0), (1, 0, 0)), CYLINDER102_ROLL_ANGLE))


with BuildPart() as fusion056_2:
    # Cylinder102 placement: moved
    add(fusion056_1.part.moved(Location((50, -10, 63))))

    # Fusion056: union Cilindro059
    add(cilindro059_2.part)


with BuildPart() as cilindro061:
    # Cylinder105 → Cylinder105 (new body)
    with BuildSketch(Plane.XY):
        Circle(CYLINDER105_R)
    extrude(amount=CYLINDER105_DEPTH)


with BuildPart() as cilindro061_1:
    # Cylinder105 roll: moved
    add(cilindro061.part.rotate(Axis((0, 0, 0), (1, 0, 0)), CYLINDER105_ROLL_ANGLE))


with BuildPart() as cilindro061_2:
    # Cylinder105 placement: moved
    add(cilindro061_1.part.moved(Location((16, -10, 63))))


with BuildPart() as fusion058:
    # Cylinder104 → Cylinder104 (new body)
    with BuildSketch(Plane.XY):
        Circle(CYLINDER104_R)
    extrude(amount=CYLINDER104_DEPTH)


with BuildPart() as fusion058_1:
    # Cylinder104 roll: moved
    add(fusion058.part.rotate(Axis((0, 0, 0), (1, 0, 0)), CYLINDER104_ROLL_ANGLE))


with BuildPart() as fusion058_2:
    # Cylinder104 placement: moved
    add(fusion058_1.part.moved(Location((50, -10, 63))))

    # Fusion057: union Cilindro061
    add(cilindro061_2.part)


with BuildPart() as fusion058_3:
    # Fusion057 placement: moved
    add(fusion058_2.part.moved(Location((0, 0, 43))))

    # Fusion058: union Fusion056
    add(fusion056_2.part)


with BuildPart() as laserpen:
    # Box053 → Box053 (new body)
    with BuildSketch(Plane(origin=(8, -23, 59), x_dir=(1, 0, 0), z_dir=(0, 0, 1))):
        with Locations((25, 2)):
            Rectangle(BOX053_W, BOX053_H)
    extrude(amount=BOX053_DEPTH)

    # Cut125: cut Fusion058
    add(fusion058_3.part, mode=Mode.SUBTRACT)

    # Fusion065: union Cut135, Cut122
    add(cut135_5.part)
    add(cut122_4.part)

    # Fillet053
    fillet053_edges = [laserpen.edges().sort_by_distance(p)[0] for p in [
        (8, -21, 111),
        (8, -21, 59),
        (58, -21, 111),
        (58, -21, 59),
    ]]
    fillet(fillet053_edges, radius=FILLET053_R)


solid = laserpen.part
